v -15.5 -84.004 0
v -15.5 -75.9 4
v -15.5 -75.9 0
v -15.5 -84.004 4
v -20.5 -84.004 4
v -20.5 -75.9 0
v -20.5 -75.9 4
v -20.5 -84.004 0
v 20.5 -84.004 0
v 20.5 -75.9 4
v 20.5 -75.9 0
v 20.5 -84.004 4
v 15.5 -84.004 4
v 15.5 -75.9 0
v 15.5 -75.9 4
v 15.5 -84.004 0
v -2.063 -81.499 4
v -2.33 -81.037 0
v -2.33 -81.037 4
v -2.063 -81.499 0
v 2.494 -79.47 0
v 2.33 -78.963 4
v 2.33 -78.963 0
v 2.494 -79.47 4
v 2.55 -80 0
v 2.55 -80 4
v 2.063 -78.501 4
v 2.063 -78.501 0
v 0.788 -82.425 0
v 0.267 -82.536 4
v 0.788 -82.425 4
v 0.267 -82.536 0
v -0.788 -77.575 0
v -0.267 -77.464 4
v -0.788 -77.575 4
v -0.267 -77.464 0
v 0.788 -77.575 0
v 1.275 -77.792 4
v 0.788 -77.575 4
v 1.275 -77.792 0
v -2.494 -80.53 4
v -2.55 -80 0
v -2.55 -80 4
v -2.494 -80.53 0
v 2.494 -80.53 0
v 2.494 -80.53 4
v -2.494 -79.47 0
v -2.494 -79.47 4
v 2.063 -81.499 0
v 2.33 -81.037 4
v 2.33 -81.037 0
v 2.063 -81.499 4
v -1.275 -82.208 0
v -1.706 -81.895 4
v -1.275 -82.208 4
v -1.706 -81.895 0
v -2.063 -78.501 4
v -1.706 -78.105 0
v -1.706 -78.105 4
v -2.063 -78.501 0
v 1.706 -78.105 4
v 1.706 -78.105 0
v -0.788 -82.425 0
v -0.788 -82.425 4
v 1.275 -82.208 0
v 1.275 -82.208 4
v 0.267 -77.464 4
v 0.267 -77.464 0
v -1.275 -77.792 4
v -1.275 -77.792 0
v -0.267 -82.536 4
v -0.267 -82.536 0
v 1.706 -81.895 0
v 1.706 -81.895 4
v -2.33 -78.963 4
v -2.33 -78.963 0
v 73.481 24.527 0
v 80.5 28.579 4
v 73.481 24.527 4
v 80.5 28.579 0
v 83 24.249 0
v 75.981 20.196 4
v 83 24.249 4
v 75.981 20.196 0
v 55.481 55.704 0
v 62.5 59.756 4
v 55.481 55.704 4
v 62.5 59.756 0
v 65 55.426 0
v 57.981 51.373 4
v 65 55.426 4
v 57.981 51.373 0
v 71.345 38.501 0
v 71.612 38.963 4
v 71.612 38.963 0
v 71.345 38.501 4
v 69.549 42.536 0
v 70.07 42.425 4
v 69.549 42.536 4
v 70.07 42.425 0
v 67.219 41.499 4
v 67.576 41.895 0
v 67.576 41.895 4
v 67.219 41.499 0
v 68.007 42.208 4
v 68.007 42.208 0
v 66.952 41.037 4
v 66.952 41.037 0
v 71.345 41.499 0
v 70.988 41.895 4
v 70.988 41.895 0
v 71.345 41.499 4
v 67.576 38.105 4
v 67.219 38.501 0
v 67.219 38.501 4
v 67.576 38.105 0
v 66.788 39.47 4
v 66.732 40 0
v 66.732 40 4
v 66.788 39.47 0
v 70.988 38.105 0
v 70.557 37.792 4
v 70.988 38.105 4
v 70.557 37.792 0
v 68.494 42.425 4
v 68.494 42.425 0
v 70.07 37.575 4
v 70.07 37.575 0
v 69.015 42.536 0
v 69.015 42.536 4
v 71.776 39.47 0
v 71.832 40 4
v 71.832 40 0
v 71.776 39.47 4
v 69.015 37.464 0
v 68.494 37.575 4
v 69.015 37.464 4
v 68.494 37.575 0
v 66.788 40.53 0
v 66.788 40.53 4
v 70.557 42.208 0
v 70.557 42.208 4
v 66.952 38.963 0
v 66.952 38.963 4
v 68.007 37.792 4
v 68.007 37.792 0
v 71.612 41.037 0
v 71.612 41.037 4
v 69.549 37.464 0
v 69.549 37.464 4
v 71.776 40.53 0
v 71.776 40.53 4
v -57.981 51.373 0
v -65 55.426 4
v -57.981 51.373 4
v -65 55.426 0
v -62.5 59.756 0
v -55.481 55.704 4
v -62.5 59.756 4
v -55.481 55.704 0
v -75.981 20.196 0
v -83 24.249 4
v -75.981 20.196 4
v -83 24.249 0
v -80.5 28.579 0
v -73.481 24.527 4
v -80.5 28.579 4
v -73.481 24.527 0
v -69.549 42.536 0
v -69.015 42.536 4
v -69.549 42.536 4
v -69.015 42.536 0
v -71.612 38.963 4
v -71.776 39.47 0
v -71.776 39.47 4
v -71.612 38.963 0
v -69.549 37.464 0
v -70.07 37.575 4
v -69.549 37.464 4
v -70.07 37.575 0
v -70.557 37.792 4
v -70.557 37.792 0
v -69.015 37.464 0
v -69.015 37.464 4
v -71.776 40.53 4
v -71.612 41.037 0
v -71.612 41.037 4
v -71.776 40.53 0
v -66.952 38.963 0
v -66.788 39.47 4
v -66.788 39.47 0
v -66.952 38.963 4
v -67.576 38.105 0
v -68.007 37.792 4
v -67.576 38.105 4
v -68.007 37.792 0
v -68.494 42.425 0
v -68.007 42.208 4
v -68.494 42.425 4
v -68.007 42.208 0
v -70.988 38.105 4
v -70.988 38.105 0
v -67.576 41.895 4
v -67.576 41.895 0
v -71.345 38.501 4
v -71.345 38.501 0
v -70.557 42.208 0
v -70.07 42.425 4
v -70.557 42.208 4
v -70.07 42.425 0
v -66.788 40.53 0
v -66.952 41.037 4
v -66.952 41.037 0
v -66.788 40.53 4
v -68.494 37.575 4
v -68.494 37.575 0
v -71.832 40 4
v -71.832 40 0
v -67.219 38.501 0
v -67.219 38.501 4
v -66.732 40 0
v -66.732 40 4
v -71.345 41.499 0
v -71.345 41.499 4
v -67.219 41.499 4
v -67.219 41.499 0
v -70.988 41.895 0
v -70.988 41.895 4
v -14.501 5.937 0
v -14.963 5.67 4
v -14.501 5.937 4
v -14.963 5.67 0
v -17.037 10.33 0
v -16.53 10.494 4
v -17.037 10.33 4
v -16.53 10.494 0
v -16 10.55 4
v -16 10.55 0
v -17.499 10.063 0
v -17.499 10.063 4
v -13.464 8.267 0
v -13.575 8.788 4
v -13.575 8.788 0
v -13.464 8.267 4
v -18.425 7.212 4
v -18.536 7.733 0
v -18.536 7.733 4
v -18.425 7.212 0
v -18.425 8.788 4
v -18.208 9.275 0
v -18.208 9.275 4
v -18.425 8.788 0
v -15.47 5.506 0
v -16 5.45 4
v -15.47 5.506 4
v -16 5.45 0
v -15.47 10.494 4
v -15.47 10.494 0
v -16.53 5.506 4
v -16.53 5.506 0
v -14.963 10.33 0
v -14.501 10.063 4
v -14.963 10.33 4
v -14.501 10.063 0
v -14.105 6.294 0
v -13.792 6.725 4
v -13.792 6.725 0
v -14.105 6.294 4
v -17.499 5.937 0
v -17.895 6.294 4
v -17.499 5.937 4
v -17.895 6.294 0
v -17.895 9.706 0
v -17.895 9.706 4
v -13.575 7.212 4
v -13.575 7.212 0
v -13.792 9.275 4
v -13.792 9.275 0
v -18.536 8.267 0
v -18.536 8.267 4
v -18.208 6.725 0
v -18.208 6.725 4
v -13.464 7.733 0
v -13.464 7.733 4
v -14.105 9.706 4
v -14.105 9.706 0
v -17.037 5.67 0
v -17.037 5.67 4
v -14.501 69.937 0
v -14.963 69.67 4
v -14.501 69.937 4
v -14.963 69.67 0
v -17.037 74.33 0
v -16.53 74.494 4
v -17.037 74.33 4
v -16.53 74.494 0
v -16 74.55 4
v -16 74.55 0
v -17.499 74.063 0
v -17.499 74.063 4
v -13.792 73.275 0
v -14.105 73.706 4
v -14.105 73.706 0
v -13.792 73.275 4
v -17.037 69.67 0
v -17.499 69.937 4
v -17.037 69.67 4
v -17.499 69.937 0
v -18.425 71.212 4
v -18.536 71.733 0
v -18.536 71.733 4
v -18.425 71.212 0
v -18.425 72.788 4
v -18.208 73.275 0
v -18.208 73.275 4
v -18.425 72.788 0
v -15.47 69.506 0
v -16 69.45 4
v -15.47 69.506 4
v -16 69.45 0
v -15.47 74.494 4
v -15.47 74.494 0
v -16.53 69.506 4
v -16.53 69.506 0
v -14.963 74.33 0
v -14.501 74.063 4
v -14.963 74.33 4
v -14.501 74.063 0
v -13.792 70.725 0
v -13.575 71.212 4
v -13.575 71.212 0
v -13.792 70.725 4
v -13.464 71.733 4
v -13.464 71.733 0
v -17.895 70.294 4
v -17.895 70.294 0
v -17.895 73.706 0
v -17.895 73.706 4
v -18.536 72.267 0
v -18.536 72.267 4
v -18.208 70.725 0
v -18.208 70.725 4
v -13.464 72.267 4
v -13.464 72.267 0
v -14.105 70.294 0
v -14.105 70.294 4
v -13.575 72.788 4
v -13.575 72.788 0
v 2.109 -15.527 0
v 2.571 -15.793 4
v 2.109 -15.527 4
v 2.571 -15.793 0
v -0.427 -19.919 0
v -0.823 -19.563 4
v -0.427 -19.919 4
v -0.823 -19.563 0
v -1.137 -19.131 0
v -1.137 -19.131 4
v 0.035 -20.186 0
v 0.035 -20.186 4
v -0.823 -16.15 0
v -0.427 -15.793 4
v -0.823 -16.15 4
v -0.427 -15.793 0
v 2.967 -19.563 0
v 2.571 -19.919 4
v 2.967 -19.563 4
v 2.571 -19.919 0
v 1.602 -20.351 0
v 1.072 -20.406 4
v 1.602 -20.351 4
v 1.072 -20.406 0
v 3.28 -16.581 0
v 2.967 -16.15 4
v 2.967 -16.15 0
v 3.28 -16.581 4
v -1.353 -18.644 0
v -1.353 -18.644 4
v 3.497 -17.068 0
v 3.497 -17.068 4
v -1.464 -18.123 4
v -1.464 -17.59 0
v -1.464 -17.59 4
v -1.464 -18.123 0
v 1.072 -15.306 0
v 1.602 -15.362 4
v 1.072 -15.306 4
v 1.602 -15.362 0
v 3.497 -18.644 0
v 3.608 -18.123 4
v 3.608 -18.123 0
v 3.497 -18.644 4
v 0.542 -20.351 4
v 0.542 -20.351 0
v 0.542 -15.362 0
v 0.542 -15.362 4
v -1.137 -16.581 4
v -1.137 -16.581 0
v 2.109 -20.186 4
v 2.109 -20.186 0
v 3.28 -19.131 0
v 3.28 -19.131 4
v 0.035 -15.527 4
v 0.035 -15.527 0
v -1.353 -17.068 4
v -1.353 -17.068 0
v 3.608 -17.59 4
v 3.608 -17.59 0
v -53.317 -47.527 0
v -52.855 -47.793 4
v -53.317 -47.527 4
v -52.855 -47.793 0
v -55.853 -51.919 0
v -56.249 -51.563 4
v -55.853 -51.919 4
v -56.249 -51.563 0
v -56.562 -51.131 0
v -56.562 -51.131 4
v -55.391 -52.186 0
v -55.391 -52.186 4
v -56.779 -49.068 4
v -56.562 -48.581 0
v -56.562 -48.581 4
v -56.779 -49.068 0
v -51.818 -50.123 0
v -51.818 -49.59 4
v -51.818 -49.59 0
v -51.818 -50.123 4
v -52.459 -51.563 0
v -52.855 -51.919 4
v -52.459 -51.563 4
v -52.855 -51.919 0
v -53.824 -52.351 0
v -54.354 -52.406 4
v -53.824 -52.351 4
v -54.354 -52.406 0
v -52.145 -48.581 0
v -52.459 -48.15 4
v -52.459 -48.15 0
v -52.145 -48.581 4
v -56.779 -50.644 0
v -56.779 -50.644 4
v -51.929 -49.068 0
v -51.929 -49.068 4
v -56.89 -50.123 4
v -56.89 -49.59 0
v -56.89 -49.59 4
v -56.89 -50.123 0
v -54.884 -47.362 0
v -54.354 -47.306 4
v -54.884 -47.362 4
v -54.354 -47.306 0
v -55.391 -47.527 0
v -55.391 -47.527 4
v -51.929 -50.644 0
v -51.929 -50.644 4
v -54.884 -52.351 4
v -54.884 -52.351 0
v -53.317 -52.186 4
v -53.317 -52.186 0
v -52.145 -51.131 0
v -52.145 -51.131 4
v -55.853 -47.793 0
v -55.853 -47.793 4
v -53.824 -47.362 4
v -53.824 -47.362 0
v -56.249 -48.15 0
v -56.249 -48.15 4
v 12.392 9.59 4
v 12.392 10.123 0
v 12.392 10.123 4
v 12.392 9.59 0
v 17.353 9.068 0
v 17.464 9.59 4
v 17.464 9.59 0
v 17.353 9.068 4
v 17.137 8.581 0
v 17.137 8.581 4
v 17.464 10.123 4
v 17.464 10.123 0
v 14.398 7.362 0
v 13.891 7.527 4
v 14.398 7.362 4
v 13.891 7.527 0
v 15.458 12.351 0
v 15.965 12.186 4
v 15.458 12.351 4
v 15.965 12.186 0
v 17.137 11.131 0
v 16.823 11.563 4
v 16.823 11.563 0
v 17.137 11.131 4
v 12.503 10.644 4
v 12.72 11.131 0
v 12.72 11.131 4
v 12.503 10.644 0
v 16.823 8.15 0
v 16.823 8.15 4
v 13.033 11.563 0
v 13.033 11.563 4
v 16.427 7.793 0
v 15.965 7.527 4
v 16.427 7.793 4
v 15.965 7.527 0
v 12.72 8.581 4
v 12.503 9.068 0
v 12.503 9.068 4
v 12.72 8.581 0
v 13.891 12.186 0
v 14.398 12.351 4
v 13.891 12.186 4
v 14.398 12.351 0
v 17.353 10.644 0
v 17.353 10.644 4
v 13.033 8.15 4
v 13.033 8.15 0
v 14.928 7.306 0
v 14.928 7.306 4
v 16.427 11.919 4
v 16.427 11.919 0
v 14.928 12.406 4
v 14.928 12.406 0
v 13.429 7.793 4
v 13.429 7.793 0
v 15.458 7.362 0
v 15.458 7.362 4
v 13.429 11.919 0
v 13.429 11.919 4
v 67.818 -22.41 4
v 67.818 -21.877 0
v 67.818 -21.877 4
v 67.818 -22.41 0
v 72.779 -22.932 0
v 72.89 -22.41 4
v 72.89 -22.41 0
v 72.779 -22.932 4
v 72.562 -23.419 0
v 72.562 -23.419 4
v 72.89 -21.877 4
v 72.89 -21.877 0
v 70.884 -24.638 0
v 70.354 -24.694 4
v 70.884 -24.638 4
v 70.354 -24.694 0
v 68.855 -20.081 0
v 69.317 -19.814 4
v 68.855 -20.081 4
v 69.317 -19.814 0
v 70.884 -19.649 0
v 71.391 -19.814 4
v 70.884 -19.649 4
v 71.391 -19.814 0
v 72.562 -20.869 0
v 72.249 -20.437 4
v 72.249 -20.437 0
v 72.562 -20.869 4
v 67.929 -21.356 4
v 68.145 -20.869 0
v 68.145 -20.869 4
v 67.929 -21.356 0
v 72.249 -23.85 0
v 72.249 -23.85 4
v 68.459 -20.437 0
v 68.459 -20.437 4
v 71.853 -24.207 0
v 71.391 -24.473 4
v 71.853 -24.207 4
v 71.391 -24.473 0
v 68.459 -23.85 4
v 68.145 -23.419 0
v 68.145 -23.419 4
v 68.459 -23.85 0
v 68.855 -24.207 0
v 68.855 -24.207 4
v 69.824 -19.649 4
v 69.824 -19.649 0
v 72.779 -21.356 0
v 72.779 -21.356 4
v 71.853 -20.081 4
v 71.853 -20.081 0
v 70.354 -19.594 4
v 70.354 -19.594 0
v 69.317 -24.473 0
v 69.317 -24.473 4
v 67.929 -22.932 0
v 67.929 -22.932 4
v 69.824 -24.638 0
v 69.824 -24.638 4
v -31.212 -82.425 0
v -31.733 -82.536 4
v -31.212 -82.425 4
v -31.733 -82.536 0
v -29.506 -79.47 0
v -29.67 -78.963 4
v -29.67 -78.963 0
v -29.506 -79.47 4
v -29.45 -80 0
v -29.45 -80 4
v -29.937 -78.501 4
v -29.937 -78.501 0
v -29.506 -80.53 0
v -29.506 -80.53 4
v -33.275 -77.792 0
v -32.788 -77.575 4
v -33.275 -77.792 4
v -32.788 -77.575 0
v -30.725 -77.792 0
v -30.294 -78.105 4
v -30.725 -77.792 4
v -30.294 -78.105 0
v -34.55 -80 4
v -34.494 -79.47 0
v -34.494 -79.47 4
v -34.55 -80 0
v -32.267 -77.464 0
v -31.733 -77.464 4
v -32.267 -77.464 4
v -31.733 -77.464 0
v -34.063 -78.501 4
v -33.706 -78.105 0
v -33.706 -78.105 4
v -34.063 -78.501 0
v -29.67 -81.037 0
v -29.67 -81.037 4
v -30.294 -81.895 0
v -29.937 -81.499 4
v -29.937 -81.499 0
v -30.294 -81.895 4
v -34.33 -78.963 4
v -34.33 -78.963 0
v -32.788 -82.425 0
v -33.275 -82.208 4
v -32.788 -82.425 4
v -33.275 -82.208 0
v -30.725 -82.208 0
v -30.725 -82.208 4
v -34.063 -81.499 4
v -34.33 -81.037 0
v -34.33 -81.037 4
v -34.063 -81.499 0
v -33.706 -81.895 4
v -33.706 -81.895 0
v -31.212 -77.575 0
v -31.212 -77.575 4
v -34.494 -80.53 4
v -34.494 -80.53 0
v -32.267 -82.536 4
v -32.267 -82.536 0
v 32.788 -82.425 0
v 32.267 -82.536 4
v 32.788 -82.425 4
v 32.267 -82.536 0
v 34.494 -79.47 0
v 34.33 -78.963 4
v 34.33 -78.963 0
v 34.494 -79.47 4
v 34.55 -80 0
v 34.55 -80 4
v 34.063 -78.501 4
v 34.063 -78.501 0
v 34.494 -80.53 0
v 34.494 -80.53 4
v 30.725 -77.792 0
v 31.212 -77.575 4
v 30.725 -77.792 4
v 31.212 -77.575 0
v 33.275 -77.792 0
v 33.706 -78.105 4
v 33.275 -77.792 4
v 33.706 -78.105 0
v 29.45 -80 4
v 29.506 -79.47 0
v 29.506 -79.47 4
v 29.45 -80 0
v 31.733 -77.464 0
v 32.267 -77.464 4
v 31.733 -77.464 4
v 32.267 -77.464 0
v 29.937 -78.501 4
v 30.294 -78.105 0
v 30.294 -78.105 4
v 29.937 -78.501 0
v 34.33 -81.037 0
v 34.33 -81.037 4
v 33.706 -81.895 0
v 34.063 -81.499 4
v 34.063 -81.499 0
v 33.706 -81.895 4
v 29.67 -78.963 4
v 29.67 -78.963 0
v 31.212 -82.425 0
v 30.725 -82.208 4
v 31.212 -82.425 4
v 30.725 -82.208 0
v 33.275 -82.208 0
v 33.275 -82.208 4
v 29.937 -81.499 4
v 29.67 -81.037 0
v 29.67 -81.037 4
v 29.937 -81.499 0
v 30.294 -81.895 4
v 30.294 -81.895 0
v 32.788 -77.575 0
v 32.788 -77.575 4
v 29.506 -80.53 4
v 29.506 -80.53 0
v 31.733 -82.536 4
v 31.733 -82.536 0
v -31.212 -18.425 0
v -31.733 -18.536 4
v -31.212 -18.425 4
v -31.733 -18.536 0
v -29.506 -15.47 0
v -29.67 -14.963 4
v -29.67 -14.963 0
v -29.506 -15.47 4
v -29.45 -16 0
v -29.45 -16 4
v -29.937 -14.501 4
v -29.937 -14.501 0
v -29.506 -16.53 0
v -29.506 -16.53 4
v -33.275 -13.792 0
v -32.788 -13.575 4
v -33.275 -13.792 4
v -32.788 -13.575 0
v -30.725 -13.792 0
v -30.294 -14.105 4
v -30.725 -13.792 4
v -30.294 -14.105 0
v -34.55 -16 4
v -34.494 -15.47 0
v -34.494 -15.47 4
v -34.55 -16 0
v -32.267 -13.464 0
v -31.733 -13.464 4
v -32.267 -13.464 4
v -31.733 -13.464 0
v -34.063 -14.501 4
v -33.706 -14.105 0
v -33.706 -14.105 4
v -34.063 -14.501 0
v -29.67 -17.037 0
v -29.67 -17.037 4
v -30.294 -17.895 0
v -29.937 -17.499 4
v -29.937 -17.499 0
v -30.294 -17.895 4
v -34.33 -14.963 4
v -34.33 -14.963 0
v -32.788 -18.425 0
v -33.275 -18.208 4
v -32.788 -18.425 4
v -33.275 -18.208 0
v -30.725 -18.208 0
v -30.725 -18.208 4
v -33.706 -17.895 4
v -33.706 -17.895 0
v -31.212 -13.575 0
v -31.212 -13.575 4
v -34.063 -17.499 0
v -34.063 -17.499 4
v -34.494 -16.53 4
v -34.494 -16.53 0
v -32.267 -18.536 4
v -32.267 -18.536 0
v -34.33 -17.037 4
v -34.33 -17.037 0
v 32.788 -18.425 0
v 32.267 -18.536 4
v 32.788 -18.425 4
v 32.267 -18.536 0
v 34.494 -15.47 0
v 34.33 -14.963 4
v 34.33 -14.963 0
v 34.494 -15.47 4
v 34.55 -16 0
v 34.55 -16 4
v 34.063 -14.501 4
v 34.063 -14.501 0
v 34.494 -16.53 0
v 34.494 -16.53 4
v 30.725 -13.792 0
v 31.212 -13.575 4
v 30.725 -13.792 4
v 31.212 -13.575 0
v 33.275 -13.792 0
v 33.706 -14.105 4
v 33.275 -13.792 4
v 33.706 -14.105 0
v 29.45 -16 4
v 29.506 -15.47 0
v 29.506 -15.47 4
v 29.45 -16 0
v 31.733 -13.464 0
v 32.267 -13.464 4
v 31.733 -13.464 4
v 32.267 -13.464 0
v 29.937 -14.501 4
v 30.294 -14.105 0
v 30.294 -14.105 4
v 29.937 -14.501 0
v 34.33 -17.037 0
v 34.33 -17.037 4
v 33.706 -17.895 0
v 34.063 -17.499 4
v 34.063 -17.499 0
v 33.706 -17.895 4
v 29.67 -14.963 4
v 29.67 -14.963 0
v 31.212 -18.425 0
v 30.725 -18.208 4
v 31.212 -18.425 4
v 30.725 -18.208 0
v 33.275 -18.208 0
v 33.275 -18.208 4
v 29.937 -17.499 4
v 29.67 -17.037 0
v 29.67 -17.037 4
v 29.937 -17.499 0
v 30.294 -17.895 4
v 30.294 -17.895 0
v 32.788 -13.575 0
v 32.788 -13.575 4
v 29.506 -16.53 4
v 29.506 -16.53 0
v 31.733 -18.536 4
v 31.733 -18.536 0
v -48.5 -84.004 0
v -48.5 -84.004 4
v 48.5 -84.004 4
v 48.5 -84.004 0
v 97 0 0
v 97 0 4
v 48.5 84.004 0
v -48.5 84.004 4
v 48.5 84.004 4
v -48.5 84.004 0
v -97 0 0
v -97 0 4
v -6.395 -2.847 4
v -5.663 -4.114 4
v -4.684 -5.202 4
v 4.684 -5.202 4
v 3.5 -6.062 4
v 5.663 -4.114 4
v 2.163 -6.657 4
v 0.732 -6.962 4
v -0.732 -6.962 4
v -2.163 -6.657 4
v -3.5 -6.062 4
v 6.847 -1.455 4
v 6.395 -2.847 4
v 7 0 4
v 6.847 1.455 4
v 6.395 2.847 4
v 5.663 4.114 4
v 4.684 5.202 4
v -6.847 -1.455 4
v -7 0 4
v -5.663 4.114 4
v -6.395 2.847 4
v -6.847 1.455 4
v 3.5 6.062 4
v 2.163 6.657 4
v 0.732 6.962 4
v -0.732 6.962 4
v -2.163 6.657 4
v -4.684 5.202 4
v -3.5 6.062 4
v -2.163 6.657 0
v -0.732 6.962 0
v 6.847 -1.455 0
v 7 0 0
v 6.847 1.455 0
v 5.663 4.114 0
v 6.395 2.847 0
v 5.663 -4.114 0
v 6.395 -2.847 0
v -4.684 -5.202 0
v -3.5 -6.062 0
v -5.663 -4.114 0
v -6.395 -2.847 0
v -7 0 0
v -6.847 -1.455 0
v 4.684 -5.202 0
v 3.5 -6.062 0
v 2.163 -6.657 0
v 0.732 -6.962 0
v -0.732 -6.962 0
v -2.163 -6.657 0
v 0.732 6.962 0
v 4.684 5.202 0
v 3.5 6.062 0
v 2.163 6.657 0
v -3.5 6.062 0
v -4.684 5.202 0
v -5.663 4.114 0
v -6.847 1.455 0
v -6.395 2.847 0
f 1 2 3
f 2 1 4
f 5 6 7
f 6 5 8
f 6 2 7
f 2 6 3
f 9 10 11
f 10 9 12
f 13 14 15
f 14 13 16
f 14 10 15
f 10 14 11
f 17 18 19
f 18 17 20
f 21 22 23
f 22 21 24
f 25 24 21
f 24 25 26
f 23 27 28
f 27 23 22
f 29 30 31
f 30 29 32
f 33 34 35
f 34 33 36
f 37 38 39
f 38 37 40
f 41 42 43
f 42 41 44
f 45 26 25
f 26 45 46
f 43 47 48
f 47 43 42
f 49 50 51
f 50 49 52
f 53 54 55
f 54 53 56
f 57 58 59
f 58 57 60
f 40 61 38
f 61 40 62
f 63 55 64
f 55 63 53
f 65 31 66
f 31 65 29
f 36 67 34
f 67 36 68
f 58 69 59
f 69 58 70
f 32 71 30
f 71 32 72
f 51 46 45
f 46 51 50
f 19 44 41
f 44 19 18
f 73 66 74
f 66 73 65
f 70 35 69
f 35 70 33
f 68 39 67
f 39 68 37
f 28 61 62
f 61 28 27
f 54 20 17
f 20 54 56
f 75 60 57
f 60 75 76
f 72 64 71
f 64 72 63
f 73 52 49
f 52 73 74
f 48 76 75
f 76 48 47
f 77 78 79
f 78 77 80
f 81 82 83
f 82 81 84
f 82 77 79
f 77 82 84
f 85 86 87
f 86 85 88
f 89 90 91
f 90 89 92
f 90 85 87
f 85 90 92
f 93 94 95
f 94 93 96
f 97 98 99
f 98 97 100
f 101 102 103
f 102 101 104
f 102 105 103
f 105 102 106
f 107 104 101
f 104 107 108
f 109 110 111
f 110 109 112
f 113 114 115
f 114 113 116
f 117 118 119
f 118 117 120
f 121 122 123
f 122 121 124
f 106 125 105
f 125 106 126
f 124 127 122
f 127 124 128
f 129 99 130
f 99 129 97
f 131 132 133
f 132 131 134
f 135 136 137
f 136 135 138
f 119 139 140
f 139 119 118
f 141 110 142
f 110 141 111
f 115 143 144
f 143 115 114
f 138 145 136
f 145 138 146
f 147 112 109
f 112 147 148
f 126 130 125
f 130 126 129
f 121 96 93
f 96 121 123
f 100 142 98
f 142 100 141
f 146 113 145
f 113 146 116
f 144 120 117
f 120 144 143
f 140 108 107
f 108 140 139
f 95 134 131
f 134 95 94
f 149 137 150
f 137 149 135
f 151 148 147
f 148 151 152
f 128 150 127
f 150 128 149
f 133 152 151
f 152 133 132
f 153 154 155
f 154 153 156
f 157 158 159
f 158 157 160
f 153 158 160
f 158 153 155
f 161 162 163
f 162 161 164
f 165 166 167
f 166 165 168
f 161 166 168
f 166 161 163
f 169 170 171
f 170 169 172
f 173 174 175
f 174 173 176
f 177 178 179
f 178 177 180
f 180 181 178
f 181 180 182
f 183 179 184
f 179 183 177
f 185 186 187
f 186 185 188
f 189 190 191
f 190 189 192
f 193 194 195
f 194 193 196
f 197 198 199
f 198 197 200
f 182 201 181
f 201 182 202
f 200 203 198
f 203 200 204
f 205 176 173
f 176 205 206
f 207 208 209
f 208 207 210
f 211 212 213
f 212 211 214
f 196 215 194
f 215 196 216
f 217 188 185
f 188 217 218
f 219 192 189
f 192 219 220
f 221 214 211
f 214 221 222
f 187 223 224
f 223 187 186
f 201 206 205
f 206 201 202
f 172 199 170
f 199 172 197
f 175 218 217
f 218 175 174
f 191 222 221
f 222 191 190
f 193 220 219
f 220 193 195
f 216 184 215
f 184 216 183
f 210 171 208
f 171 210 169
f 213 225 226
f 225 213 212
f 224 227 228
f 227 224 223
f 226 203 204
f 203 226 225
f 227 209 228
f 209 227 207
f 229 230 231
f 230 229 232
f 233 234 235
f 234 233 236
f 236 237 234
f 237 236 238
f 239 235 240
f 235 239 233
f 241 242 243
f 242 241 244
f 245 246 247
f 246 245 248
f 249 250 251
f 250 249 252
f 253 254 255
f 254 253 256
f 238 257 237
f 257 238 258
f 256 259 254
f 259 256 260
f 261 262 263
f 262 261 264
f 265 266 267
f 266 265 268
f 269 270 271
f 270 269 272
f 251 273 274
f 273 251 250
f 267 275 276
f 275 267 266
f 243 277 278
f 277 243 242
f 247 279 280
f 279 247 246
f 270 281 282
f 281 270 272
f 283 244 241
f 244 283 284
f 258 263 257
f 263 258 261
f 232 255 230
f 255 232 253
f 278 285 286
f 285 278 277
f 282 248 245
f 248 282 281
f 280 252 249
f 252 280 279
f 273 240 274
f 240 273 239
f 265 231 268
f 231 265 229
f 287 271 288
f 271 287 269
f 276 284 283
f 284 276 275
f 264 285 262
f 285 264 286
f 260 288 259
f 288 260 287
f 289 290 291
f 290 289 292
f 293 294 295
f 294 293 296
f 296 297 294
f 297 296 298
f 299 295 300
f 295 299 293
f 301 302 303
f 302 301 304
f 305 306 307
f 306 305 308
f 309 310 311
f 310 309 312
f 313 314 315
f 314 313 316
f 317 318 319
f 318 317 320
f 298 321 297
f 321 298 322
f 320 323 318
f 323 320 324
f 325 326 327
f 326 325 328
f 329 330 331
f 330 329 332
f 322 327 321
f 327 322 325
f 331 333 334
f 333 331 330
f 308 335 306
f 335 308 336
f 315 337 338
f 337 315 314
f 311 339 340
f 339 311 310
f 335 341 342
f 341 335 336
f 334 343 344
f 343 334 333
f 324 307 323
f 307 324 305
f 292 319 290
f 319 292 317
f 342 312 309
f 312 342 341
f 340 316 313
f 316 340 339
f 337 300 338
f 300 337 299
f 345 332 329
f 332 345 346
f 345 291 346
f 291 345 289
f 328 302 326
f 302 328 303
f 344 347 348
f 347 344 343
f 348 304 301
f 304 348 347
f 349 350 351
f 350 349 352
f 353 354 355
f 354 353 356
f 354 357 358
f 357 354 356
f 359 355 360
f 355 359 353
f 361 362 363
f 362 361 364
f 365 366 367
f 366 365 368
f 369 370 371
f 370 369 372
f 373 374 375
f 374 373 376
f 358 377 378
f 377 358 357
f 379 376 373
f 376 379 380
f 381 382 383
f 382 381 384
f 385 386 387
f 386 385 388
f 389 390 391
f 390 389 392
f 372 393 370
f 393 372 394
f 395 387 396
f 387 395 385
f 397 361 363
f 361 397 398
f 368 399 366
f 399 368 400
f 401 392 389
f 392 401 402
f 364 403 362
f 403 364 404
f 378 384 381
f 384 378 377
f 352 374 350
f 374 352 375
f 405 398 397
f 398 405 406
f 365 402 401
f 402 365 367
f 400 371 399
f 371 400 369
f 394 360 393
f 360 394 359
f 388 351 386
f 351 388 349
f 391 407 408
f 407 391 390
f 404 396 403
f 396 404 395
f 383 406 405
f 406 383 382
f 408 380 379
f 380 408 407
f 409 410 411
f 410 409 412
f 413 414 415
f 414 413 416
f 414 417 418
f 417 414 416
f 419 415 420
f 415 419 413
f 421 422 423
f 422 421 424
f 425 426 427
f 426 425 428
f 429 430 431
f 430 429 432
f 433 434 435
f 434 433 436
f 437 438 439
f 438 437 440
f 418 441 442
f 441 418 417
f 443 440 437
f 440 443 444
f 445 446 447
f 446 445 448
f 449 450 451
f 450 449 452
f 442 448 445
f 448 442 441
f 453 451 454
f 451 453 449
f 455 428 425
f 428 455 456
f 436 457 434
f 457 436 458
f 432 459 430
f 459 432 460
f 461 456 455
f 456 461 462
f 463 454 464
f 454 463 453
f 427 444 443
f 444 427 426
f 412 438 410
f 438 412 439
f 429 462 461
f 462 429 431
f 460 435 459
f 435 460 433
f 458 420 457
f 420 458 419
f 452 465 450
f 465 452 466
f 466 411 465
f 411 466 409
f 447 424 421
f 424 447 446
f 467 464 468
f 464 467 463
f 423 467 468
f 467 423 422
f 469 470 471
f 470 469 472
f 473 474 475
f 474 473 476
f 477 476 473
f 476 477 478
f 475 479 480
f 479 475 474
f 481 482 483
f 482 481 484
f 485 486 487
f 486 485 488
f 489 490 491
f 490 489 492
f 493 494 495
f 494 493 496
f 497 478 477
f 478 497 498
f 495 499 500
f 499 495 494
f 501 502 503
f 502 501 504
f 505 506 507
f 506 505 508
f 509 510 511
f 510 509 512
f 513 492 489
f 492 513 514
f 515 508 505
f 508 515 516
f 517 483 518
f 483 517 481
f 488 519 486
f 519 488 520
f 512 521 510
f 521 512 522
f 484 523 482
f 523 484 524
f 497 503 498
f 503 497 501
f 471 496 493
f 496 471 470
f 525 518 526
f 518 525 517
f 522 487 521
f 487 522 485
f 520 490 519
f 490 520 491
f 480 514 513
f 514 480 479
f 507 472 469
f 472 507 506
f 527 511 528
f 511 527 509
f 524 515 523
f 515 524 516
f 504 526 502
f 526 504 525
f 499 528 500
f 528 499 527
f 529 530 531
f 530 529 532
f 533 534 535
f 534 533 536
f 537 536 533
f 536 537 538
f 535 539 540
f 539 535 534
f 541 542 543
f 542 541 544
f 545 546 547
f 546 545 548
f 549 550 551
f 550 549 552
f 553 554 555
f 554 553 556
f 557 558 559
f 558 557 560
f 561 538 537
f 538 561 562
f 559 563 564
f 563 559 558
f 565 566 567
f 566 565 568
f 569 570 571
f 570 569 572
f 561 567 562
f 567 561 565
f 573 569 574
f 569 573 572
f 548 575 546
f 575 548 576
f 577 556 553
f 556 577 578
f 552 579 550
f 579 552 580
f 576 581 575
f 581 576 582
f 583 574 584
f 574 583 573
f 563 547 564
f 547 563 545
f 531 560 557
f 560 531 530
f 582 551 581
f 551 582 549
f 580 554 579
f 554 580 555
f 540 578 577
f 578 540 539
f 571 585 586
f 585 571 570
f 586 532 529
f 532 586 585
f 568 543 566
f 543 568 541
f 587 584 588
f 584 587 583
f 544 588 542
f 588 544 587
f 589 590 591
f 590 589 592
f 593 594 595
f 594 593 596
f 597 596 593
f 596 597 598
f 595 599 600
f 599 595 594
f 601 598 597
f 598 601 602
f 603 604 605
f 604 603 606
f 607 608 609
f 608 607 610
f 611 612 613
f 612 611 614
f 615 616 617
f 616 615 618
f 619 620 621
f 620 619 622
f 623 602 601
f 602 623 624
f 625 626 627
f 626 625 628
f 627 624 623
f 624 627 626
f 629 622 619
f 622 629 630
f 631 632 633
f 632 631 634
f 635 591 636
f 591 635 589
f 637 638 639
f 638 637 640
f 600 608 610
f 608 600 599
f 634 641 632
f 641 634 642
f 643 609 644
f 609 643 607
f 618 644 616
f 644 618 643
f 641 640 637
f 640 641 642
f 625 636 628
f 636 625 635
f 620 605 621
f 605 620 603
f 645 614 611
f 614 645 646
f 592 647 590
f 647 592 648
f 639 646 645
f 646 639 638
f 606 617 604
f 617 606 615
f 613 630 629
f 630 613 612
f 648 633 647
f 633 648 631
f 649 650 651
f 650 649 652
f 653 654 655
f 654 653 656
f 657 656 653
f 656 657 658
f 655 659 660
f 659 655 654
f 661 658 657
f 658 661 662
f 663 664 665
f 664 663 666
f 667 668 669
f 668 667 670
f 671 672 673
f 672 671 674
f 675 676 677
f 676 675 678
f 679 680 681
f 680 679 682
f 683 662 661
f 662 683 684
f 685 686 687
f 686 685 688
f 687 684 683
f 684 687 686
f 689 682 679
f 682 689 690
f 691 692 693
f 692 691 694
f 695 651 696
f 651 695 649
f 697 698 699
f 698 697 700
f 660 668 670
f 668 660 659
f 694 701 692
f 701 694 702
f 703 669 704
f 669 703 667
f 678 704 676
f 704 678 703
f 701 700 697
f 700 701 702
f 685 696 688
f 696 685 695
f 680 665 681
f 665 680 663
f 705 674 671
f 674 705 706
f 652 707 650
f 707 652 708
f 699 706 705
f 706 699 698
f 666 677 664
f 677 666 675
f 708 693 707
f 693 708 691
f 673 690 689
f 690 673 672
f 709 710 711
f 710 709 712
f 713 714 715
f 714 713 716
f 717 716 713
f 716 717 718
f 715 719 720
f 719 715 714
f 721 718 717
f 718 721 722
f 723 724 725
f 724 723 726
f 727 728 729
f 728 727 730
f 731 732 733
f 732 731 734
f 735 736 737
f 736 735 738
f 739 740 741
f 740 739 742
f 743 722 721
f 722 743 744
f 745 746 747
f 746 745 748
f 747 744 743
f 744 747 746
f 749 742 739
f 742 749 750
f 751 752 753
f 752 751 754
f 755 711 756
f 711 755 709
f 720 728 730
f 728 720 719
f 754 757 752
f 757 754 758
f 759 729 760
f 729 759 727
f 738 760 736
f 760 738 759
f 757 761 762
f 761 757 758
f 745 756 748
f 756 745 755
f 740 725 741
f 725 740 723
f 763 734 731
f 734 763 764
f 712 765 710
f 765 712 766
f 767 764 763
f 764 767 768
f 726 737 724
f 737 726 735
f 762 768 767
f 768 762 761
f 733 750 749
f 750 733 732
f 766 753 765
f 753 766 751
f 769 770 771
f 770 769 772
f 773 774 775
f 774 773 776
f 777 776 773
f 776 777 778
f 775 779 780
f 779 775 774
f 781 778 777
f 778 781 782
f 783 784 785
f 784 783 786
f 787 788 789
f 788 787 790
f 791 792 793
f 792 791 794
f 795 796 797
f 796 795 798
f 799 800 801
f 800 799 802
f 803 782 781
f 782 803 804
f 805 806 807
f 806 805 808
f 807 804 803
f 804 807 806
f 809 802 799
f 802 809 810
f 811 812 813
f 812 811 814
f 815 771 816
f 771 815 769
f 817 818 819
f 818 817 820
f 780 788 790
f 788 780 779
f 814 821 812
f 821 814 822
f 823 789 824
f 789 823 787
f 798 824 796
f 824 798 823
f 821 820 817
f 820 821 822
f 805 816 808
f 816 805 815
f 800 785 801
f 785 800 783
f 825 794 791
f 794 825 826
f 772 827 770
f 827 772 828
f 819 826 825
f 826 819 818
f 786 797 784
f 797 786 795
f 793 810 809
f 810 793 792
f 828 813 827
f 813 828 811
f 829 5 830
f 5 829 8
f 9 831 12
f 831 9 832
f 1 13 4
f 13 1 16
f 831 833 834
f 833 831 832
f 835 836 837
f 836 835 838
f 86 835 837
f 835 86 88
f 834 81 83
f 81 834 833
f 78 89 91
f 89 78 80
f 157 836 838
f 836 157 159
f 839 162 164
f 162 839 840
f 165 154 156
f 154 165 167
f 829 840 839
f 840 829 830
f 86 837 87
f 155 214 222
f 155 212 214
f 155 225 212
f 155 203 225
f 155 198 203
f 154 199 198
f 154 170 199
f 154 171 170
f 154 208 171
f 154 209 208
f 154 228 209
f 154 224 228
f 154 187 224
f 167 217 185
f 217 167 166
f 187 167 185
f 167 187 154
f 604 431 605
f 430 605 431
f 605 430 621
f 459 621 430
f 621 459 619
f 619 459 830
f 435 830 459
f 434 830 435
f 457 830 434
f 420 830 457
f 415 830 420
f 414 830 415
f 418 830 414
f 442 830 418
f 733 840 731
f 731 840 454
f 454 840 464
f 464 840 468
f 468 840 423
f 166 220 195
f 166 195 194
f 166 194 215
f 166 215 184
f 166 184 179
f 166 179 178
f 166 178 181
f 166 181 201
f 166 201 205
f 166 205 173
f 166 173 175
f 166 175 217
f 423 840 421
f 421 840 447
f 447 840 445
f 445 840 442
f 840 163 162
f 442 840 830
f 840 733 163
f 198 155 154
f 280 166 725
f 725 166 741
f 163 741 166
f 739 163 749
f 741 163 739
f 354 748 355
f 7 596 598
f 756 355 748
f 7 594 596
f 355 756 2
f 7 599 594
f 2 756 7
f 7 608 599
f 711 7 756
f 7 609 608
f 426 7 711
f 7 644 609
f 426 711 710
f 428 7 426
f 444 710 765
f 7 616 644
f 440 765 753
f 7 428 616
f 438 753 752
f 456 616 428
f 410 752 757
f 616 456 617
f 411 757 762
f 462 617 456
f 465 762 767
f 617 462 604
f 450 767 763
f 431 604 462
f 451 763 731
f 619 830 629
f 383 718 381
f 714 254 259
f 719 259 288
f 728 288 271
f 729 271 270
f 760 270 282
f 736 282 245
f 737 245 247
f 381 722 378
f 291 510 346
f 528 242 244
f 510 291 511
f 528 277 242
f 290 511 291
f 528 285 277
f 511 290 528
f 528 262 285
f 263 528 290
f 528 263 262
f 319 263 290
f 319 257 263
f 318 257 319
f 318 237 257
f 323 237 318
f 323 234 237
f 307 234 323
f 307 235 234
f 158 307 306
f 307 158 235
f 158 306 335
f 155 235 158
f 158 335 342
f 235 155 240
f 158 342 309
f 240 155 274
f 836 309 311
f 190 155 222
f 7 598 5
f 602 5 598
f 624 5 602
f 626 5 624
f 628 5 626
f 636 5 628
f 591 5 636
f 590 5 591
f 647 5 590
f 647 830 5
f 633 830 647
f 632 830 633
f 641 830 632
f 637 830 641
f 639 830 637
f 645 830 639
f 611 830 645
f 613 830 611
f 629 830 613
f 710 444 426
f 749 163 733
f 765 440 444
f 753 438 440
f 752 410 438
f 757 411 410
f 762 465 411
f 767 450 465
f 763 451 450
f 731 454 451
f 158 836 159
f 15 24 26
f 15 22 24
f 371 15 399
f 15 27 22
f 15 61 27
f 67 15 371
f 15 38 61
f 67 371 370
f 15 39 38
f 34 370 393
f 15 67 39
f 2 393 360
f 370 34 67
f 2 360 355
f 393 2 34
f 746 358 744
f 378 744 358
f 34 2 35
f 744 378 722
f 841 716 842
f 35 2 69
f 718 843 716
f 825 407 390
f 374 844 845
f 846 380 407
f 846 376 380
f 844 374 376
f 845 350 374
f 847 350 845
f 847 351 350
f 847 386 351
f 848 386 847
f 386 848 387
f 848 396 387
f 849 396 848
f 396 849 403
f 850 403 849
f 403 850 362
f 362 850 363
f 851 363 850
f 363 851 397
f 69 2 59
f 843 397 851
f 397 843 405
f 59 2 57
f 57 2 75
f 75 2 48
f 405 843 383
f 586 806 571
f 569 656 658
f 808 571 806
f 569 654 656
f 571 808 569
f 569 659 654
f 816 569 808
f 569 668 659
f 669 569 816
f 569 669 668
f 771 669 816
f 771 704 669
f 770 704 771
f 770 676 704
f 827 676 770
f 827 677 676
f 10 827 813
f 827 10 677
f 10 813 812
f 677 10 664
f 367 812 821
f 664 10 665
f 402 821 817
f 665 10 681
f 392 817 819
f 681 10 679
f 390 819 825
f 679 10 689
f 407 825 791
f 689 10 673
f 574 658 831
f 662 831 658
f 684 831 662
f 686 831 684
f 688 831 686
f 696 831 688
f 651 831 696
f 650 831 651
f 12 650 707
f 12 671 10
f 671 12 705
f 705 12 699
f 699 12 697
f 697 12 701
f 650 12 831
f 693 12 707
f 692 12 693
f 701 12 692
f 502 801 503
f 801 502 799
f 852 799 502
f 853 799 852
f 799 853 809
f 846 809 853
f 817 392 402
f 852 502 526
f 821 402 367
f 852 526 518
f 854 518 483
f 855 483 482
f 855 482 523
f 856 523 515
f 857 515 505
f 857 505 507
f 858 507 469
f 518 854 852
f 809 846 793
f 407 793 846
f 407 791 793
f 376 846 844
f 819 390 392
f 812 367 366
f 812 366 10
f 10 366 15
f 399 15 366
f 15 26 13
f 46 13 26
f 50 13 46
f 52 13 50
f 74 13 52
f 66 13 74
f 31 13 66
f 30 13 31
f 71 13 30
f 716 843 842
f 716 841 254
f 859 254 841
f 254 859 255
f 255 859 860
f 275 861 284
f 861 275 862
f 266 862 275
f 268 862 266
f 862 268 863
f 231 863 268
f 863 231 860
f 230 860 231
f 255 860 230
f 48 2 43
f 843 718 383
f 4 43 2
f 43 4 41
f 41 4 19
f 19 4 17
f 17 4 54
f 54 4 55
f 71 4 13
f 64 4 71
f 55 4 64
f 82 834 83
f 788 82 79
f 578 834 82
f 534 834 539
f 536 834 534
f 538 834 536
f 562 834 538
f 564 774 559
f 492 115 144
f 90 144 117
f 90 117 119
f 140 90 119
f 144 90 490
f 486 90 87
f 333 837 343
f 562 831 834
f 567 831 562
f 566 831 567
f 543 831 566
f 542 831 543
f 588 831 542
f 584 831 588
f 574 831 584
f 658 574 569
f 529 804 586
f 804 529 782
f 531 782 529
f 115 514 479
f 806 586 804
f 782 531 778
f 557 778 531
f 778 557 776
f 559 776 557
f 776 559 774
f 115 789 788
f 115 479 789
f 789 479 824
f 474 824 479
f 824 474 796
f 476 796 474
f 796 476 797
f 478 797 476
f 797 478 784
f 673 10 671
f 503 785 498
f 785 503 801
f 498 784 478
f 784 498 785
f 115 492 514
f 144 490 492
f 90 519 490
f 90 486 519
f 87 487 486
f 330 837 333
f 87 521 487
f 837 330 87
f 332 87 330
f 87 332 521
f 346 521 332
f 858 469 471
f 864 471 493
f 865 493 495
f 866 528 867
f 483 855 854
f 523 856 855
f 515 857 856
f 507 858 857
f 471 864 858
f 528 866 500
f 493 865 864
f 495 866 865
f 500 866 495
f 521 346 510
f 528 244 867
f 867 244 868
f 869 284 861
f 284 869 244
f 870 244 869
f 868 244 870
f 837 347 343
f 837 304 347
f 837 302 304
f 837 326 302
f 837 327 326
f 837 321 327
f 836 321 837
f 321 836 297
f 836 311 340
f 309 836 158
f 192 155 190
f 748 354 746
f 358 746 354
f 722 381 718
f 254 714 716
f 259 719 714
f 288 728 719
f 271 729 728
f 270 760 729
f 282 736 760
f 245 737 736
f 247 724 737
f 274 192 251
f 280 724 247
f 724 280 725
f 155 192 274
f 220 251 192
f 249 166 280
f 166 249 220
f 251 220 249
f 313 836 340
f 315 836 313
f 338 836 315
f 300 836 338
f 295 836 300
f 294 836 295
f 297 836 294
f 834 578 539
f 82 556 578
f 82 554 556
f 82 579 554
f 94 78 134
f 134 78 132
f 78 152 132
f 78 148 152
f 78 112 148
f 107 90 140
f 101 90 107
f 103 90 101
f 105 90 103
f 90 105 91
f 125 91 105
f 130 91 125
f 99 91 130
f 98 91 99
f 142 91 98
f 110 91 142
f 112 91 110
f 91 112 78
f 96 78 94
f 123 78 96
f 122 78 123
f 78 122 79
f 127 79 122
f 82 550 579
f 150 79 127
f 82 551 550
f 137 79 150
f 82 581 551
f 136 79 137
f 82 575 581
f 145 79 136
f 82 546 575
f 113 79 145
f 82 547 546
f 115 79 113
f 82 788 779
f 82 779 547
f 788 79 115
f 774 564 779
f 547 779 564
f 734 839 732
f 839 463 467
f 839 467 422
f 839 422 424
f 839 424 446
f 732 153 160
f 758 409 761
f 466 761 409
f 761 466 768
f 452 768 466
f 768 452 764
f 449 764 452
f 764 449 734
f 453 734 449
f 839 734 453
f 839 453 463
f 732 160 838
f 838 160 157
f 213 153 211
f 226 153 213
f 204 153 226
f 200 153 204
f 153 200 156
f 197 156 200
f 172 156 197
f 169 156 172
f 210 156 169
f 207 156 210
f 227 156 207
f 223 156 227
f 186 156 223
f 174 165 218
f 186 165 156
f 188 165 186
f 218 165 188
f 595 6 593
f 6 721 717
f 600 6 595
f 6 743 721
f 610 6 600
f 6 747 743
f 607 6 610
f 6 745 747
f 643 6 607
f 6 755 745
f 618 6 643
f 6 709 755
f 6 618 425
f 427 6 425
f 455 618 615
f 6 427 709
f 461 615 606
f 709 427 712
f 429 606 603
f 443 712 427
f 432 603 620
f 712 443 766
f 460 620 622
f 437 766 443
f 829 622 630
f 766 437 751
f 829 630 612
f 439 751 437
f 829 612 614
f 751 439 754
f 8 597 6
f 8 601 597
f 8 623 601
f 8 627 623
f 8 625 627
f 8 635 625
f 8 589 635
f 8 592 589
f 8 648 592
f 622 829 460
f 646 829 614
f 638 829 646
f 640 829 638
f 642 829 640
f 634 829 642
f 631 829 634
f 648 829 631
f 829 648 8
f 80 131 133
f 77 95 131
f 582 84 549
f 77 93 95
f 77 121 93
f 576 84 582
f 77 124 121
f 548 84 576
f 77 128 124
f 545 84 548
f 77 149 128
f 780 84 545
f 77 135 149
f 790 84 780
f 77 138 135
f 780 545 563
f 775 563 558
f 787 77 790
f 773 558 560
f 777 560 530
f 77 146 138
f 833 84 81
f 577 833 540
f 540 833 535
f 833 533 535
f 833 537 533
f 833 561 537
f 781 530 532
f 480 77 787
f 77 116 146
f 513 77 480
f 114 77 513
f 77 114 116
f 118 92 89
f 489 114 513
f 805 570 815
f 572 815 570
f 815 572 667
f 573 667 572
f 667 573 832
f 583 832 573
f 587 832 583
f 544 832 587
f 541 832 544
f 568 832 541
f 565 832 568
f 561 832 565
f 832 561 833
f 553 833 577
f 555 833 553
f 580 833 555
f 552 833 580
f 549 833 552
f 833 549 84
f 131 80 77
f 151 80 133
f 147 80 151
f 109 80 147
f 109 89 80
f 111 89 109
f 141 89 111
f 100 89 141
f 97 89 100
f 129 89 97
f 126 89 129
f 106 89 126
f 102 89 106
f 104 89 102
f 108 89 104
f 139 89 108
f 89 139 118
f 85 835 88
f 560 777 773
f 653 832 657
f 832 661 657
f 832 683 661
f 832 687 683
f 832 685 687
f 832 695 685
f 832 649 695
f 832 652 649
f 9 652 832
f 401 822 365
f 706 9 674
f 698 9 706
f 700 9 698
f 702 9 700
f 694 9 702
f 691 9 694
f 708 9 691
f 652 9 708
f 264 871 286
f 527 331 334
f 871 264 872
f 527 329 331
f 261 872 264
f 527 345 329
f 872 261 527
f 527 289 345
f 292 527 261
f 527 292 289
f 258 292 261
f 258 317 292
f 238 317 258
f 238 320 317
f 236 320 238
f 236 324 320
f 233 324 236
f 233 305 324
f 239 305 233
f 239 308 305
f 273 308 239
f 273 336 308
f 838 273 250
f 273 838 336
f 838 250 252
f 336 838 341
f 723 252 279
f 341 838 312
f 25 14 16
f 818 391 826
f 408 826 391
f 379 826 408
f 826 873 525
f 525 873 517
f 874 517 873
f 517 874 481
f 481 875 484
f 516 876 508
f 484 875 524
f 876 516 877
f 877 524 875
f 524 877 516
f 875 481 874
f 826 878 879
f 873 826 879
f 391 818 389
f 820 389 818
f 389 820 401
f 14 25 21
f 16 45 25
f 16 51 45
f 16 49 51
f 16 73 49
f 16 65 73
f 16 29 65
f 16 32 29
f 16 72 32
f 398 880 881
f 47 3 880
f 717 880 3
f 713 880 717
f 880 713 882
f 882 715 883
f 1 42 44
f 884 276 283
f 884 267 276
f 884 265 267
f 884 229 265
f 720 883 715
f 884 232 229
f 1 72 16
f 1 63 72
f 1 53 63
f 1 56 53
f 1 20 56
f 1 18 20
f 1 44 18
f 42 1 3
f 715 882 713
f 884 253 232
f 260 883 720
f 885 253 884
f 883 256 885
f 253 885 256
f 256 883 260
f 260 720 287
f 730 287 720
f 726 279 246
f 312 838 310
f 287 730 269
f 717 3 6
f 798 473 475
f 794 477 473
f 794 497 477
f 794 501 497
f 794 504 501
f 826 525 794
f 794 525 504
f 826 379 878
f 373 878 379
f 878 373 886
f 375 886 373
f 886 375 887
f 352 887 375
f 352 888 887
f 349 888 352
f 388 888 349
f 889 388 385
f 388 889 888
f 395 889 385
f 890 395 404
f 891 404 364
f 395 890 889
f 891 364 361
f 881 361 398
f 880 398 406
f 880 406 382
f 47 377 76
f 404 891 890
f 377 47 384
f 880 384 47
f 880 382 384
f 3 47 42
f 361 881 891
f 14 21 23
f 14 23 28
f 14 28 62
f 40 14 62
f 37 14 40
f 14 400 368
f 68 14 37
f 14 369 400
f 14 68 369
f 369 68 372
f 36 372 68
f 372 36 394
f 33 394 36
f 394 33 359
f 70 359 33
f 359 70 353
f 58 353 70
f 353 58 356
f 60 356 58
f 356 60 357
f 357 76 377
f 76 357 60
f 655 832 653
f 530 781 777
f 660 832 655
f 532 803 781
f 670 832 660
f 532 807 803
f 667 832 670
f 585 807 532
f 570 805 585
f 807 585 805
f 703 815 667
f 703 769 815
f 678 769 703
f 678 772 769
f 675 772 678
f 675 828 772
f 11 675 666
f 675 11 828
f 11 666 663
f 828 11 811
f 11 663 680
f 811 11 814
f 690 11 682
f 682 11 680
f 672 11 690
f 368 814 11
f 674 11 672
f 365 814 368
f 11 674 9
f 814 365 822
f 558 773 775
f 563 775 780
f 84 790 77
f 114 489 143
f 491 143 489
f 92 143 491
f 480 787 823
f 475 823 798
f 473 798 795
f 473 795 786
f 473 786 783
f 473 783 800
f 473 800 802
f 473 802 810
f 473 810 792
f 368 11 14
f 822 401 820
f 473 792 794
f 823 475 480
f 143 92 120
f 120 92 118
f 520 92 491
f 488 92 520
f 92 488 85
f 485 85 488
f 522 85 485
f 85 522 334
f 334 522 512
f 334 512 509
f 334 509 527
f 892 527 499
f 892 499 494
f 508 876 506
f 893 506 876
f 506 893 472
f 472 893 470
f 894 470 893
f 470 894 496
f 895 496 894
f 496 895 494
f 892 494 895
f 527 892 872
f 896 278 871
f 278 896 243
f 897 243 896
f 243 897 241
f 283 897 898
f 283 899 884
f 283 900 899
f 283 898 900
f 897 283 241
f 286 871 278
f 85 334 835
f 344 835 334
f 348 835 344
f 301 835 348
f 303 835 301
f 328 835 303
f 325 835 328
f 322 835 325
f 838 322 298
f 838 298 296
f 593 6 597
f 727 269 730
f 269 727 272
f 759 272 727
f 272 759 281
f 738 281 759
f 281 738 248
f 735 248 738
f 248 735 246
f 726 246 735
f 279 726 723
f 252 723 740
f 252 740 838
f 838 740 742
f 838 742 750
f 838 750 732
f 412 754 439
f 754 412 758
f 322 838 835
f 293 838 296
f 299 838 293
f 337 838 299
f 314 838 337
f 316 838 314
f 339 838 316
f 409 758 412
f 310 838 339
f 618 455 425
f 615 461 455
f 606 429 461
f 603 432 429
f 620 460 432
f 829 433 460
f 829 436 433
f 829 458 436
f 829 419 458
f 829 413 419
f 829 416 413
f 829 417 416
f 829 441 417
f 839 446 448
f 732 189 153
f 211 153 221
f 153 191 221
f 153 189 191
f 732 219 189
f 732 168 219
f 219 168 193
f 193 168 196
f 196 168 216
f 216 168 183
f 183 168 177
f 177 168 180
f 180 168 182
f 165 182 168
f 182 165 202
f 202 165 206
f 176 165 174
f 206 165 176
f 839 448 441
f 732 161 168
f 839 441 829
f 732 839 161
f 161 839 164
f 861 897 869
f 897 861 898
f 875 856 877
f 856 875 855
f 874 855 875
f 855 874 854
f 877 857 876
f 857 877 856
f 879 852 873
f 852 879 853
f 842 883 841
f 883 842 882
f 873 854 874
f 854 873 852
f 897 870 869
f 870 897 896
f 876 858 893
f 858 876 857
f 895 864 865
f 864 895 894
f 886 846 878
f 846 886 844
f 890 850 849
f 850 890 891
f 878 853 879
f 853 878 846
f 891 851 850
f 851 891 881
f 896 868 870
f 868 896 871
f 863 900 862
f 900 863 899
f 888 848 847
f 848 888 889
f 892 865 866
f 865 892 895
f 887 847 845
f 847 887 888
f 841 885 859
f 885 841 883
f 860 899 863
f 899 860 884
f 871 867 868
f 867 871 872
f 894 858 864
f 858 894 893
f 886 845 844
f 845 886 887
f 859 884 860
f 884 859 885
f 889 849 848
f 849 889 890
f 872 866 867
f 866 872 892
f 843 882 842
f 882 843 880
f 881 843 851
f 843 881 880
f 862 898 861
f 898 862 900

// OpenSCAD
beam_width    = 8;
hole_diameter = 5.1;
hole_radius   = hole_diameter / 2;

module beam(number_of_holes, step=8) {
    beam_length = number_of_holes * 8;
        // Cut the holes
        for (x=[4 : step : beam_length]) {
            translate([x-4,0,2])
            cylinder(r=2.55, h=12, $fn=30);
        }
}


module joint(){
    translate([-20.5,-85,-4])
    cube([5,9.1,20]);

    translate([15.5,-85,-4])
    cube([5,9.1,20]);

    translate([0,-beam_width*10,-10])
    cylinder(r=hole_radius, h=25, $fn=30);
}

module side_connectors() {
    joint();
    
    rotate(120)
    joint();
    
    rotate(240)
    joint();
}



// Uncomment 'projection' to create 2D (DXF-able) version
//projection(cut=true) {
union(){
    difference(){

        // Base plate
        //cube([8*9, beam_width * 9, 4]);
        cylinder(r=beam_width*12+1, h=4, $fn=6);

        // Center hole
        translate([0,0,-2]) 
        cylinder(r=7, h=8, $fn=30);

        // Delta-bot leg mounting holes
        //translate([36,36,-5]) 
        translate([0,0,-5])
        side_connectors();
        
        rotate(90)
        translate([0,0,-5])
        center_connectors();

        rotate(0)
        translate([0,-8*6,0])
        box();
    }

    //translate([-4.5*beam_width,-10.5*beam_width,3])
    //cube([9*beam_width, 9*beam_width, 2]);
   
    rotate([0,0,180])
    translate([0,-50,4])
    linear_extrude(center=true, height=4) import("tapster.dxf");
}
//}


module box() {
        // Bottom row
        translate([-beam_width * 5,-beam_width*5+4,0])
        for (x=[8 :  beam_width * 8 : beam_width * 9]) {
            translate([x, beam_width/2, -10])
            cylinder(r=2.55, h=20, $fn=30);
        }
    
        // Top row
        translate([-beam_width * 5,-beam_width*4-4,0])
        for (x=[8 : beam_width * 8 : beam_width * 9]) {
            translate([x, (beam_width/2) + beam_width * 8, -10])
            cylinder(r=2.55, h=20, $fn=30);
       }
}

module center_connectors() {
    translate([8,16,0])
    rotate(a=0)
    beam(10,step=8*8);
    

    rotate(a=120)
    translate([8,16,0])
    beam(10,step=8*8);
    

    rotate(a=240)
    translate([8,16,0])
    beam(10,step=8*8);
}
